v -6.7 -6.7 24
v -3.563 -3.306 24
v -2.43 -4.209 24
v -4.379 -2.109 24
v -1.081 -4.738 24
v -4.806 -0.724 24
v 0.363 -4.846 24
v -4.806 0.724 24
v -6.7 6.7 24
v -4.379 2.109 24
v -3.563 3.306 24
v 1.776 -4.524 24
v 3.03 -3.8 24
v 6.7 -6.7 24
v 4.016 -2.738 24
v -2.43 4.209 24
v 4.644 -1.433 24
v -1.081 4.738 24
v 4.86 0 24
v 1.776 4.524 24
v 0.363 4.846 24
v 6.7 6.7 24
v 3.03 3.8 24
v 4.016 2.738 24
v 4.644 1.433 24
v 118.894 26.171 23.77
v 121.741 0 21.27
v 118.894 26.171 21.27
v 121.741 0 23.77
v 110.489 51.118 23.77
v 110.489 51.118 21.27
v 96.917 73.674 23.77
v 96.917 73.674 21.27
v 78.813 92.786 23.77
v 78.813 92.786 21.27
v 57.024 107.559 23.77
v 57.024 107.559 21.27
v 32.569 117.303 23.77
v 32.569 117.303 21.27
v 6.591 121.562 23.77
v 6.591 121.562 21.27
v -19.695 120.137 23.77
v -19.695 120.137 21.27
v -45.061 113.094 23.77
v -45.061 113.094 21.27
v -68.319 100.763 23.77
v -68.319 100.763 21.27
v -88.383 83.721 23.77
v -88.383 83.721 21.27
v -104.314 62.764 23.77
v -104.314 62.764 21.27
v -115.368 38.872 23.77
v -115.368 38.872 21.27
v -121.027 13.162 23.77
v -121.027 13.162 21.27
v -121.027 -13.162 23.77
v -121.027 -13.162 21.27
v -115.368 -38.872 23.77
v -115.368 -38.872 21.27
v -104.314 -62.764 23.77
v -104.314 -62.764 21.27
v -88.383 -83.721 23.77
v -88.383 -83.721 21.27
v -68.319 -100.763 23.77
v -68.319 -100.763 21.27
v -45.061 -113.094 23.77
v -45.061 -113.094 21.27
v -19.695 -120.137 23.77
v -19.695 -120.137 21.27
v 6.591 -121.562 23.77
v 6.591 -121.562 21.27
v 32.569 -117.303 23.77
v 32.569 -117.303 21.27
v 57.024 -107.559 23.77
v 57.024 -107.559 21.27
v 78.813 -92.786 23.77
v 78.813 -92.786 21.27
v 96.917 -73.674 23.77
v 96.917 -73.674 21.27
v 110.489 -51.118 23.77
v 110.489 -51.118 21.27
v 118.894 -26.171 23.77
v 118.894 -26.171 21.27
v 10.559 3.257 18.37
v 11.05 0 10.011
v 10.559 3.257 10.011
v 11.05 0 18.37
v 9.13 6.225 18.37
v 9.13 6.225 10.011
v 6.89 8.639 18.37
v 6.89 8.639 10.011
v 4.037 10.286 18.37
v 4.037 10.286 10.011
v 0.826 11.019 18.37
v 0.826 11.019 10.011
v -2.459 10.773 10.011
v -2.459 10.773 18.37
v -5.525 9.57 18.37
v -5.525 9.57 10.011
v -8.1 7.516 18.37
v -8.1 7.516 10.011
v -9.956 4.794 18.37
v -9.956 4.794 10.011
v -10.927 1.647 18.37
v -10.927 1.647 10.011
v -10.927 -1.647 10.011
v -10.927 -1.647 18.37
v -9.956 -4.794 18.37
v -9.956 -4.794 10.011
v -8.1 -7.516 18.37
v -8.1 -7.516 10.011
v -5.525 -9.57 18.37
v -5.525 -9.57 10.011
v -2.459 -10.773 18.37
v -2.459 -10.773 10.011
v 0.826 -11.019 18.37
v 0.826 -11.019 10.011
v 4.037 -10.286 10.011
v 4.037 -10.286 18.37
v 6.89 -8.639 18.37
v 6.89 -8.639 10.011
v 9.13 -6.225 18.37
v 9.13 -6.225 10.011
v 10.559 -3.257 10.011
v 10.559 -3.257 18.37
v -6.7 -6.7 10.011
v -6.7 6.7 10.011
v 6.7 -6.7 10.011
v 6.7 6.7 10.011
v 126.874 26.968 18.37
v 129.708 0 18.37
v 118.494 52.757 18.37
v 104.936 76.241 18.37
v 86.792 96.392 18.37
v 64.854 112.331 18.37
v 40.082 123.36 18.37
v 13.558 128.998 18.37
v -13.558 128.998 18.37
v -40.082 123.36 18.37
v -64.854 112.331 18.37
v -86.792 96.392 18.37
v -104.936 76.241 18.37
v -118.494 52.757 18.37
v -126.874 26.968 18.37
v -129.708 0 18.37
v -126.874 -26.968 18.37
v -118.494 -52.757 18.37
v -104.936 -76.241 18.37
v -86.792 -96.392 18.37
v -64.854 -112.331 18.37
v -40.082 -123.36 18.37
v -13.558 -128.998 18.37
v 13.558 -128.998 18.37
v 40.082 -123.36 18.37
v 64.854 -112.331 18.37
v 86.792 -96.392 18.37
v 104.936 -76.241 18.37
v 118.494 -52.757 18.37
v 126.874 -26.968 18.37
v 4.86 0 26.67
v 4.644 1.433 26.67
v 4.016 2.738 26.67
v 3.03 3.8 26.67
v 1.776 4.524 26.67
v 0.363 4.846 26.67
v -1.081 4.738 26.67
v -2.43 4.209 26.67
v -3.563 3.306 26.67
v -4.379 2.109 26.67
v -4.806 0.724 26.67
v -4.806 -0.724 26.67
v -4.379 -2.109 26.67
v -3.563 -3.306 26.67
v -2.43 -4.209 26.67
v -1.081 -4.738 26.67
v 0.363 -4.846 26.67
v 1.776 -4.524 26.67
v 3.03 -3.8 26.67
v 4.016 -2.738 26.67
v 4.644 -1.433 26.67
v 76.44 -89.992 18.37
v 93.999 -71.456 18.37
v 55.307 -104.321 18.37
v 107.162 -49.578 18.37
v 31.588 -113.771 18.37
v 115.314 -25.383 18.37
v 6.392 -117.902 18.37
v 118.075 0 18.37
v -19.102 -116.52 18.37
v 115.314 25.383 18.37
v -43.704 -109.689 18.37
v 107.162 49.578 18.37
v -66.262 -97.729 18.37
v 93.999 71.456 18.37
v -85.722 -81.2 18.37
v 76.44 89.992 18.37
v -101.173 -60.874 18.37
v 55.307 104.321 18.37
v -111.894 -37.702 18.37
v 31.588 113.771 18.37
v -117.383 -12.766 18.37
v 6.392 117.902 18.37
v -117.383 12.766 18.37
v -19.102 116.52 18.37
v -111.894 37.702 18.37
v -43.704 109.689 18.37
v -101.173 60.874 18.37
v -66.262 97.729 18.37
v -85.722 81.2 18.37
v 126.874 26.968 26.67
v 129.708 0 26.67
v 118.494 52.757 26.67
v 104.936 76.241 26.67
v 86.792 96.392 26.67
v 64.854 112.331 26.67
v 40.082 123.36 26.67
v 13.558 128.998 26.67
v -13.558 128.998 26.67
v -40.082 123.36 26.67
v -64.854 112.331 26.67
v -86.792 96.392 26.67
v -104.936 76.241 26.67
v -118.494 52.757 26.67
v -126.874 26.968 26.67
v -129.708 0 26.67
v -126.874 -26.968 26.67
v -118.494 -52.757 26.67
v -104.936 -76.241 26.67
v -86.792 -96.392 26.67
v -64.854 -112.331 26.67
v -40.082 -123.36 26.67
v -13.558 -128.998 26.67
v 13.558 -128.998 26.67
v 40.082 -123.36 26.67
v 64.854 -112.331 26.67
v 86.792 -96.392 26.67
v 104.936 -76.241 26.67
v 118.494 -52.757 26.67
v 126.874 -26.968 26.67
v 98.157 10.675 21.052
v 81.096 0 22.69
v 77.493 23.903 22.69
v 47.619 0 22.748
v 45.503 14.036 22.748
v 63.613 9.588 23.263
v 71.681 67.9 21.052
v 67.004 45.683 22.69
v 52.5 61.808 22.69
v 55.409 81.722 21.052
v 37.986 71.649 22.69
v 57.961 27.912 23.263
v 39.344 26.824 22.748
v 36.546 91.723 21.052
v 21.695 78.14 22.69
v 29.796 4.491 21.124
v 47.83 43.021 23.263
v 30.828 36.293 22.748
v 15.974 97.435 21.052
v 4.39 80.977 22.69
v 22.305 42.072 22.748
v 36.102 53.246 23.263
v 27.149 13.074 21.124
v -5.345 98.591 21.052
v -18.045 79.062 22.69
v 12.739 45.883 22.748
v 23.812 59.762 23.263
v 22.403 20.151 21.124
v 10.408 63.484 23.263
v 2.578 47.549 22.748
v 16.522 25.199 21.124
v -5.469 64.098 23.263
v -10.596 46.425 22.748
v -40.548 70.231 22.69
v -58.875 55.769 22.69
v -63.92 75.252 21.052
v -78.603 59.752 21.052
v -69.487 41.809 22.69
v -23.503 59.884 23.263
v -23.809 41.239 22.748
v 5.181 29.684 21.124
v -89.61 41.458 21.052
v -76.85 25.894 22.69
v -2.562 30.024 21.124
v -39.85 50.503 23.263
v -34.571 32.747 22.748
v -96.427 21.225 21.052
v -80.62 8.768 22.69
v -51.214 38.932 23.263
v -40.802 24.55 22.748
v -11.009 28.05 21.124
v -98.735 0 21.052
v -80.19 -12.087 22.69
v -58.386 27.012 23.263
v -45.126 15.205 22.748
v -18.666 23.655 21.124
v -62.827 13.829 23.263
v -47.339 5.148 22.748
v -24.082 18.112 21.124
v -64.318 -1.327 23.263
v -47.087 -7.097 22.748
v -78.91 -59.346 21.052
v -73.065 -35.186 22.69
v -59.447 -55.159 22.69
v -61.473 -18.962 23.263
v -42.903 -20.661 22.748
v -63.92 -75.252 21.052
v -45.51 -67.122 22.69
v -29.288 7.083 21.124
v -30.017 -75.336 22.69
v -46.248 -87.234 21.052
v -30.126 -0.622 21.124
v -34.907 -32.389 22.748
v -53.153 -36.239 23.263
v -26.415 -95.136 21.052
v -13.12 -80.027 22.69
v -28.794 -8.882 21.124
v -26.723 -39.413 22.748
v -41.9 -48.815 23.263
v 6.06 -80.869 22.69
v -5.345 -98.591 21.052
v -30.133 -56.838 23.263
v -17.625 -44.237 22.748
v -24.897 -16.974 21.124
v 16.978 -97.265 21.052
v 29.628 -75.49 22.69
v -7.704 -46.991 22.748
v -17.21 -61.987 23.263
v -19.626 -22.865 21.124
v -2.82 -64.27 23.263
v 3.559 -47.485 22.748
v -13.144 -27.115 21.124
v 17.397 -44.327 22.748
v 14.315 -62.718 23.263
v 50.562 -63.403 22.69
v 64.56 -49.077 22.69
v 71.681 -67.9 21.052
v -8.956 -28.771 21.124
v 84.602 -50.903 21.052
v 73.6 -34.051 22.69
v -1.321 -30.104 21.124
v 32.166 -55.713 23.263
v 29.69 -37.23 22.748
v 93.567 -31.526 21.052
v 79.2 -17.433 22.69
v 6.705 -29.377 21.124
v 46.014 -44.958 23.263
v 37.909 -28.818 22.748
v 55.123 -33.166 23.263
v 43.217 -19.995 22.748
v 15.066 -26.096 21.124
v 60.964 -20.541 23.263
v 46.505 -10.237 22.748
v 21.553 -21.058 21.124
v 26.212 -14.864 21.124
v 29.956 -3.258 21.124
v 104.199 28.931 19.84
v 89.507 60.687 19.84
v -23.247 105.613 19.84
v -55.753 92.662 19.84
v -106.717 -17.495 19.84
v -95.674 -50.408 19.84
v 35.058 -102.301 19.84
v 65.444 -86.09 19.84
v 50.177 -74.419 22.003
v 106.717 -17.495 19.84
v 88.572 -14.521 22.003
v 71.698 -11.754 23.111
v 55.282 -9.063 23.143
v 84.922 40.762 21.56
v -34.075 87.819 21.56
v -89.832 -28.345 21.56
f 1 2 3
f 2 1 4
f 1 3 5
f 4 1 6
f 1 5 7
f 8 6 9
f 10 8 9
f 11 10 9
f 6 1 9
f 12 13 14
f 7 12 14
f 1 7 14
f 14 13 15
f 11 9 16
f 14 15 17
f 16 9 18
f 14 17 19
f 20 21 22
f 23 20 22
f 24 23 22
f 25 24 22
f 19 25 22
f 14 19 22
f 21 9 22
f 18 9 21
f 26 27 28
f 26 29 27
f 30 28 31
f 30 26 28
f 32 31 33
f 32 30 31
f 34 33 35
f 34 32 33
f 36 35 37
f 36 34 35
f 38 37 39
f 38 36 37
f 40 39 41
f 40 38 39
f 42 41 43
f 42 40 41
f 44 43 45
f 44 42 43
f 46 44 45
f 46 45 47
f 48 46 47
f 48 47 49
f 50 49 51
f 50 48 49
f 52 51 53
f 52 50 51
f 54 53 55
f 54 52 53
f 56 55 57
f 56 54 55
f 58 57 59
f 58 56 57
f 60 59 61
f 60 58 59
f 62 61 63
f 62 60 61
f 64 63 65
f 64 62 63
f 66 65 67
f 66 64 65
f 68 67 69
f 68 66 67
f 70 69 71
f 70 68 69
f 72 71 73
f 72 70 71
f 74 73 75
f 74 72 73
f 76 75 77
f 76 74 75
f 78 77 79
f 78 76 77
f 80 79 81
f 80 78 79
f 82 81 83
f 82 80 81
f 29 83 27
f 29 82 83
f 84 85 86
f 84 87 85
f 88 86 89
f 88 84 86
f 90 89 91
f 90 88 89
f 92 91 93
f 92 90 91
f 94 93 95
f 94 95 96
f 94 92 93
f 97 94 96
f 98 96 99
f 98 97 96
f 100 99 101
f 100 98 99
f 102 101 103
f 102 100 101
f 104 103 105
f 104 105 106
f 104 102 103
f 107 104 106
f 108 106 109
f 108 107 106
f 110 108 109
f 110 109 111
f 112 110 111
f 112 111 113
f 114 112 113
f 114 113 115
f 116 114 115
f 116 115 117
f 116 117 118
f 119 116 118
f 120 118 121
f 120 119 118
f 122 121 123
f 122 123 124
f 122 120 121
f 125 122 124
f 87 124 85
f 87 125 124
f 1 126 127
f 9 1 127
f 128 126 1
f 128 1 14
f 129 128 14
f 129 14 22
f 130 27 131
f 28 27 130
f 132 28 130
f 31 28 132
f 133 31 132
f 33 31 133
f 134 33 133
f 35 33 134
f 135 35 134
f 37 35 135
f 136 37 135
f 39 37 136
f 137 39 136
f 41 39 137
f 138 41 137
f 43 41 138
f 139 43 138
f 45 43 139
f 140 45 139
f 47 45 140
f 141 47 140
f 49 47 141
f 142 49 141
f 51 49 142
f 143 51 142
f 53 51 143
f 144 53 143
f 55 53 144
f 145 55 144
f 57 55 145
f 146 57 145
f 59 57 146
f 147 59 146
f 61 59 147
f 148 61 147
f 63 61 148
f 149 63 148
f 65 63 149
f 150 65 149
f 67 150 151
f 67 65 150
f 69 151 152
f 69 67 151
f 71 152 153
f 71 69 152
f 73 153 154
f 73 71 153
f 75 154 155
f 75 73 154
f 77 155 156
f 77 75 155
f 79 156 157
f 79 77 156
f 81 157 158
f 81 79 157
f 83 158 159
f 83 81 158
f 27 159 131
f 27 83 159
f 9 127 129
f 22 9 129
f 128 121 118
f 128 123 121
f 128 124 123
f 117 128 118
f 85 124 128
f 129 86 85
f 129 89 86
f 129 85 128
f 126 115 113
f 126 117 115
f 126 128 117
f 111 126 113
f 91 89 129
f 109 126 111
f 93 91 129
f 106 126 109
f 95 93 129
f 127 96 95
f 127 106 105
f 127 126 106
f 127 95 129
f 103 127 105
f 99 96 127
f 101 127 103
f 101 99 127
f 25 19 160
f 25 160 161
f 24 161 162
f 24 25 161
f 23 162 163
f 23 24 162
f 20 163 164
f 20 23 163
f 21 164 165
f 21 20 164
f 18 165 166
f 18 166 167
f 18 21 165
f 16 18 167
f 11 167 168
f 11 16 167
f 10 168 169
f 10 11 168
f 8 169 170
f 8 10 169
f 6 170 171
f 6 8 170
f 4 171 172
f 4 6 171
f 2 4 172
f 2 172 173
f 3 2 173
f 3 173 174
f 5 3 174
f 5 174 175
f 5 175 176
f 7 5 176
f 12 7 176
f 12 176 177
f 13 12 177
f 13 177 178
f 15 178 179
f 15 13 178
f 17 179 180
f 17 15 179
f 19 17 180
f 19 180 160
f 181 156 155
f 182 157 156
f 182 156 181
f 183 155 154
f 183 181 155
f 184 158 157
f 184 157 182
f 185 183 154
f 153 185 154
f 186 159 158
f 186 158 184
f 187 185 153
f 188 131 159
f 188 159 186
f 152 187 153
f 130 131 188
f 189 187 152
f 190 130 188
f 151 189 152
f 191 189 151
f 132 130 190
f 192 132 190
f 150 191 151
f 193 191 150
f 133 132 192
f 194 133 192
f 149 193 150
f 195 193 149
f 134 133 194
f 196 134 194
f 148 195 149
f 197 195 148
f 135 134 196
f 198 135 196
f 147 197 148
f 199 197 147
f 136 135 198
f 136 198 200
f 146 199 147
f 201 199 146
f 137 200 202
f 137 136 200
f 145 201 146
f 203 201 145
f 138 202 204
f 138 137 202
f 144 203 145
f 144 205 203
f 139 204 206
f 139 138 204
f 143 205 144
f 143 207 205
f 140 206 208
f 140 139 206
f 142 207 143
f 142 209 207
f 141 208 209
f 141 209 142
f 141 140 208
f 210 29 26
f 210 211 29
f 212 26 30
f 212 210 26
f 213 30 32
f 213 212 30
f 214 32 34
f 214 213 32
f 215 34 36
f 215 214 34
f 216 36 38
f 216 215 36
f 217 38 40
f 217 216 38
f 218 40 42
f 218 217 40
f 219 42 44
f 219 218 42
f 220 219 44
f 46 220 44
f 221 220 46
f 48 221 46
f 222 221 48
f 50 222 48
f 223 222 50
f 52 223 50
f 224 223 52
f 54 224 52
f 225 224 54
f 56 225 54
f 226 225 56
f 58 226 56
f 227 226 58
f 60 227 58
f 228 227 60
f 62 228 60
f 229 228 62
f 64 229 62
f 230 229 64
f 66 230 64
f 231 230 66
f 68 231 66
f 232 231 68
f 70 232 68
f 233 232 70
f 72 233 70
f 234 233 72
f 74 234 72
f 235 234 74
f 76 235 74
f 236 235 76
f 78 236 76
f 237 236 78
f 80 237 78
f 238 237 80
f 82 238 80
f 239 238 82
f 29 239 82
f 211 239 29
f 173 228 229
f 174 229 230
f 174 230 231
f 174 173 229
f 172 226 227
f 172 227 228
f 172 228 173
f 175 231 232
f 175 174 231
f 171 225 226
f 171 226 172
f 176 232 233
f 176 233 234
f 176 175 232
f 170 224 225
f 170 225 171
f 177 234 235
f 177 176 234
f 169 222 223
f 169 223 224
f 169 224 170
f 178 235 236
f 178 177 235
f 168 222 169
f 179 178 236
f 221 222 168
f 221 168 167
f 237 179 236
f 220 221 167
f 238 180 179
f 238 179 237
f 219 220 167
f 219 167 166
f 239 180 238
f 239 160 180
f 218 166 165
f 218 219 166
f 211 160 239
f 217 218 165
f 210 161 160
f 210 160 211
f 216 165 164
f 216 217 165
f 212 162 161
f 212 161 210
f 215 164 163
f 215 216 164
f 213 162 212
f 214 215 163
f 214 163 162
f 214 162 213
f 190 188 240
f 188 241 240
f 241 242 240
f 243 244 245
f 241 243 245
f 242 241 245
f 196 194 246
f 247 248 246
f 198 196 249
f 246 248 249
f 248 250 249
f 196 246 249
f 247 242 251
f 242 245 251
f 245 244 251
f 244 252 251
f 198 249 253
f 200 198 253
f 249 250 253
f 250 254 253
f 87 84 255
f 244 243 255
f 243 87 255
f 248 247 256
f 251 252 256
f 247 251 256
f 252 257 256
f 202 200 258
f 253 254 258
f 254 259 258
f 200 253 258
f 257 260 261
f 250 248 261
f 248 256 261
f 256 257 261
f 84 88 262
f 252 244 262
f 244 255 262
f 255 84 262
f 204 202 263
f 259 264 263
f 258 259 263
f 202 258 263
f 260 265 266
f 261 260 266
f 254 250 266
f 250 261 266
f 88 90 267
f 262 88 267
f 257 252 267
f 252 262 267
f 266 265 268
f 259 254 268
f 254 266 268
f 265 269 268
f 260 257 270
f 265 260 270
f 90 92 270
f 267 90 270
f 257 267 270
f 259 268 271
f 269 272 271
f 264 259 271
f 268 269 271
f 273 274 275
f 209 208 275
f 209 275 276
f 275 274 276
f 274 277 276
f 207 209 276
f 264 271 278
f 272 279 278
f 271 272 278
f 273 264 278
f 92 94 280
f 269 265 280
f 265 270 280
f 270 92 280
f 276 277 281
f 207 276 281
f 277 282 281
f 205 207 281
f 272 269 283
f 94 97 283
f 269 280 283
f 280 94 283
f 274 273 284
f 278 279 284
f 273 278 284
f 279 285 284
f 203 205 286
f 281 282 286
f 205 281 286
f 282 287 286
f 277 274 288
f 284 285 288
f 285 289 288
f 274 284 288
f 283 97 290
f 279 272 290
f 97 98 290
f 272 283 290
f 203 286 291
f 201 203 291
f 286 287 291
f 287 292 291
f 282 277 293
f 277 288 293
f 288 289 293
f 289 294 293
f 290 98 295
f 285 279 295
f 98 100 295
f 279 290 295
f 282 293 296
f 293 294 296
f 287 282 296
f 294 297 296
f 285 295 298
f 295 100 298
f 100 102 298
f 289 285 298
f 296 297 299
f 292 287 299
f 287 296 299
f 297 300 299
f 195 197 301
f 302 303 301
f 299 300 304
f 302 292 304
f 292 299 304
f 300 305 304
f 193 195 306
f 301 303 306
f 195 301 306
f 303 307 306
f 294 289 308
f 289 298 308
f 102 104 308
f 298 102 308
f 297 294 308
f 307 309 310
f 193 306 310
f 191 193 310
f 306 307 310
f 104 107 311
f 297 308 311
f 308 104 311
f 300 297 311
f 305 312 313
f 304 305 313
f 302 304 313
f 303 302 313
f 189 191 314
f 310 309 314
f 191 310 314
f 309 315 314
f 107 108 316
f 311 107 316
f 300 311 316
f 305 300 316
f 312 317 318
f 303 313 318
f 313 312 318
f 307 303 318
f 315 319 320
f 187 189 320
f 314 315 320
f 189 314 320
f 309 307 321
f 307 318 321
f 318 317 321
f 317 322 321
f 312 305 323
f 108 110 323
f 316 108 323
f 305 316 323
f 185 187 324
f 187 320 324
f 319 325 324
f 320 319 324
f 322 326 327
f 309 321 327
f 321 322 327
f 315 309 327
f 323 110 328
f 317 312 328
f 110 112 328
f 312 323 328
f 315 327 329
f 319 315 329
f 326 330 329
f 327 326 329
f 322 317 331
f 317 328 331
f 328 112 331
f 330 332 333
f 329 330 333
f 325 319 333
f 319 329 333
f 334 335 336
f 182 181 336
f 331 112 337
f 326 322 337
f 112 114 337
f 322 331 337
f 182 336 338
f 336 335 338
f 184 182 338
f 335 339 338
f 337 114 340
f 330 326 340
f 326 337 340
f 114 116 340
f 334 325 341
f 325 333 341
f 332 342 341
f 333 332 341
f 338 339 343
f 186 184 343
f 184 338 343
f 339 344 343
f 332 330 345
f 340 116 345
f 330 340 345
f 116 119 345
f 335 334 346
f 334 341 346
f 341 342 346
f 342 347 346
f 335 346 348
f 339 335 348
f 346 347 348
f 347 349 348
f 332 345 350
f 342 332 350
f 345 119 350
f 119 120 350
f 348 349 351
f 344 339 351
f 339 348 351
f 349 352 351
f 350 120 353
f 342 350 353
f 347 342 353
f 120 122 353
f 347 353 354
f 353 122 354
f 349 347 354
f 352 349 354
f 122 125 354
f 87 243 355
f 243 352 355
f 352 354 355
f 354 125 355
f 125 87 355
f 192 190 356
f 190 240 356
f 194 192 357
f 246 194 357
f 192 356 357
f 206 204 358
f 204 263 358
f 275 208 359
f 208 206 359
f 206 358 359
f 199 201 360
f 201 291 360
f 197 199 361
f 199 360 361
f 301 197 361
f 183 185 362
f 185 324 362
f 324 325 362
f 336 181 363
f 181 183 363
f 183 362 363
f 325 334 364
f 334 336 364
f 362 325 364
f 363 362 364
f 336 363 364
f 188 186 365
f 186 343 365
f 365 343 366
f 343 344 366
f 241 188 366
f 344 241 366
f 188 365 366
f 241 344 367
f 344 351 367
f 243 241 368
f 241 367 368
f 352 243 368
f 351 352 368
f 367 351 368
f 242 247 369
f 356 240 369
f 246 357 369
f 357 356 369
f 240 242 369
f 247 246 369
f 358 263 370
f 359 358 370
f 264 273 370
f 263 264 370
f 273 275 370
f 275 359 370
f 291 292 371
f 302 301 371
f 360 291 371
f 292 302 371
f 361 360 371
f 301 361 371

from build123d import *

# Parameters (mm, degrees)
BOX_W     = 13.4
BOX_H     = 13.4
BOX_DEPTH = 14


with BuildPart() as cube:
    # Box → Box (new body)
    with BuildSketch(Plane(origin=(-6.7, -6.7, 10), x_dir=(1, 0, 0), z_dir=(0, 0, 1))):
        with Locations((6.7, 6.7)):
            Rectangle(BOX_W, BOX_H)
    extrude(amount=BOX_DEPTH)


with BuildPart() as cut:
    # Sketch → Revolve (revolve)
    with BuildSketch(Plane.XZ):
        with BuildLine():
            Line((118.075, 18.37), (129.708369, 18.37))
            Line((129.708369, 18.37), (121.740684, 21.27))
            Line((121.740684, 21.27), (121.740684, 23.77))
            Line((121.740684, 23.77), (129.708369, 26.67))
            Line((129.708369, 26.67), (4.86, 26.67))
            Line((4.86, 26.67), (4.86, 10.010664))
            Line((4.86, 10.010664), (11.05, 10.010664))
            Line((11.05, 10.010664), (11.05, 18.37))
            add(Edge.make_bspline(
                [(118.075, 18.37), (77.146439, 24.763197), (51.362286, 25.0243), (11.05, 18.37)],
                knots=[0, 0, 0, 0, 1, 1, 1, 1], degree=3))
        make_face()
    revolve(axis=Axis((0, 0, 0), (0, 0, 1)))

    # Cut: cut Cube
    add(cube.part, mode=Mode.SUBTRACT)


solid = cut.part
